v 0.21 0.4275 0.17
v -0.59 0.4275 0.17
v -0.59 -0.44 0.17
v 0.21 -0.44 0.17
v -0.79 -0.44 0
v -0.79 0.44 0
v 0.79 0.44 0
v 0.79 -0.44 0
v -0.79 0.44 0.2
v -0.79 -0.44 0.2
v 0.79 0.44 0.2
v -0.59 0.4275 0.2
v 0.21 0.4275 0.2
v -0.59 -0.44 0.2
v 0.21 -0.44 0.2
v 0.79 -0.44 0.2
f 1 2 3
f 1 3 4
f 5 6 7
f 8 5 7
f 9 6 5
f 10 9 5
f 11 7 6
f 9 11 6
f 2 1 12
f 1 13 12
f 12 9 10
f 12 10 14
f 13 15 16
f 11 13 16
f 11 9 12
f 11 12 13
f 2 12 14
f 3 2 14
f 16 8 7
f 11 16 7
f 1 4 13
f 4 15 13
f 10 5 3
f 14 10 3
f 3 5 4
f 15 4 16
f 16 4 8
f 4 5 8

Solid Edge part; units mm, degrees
sketch "Sketch1" plane through (0, 0, 0) normal (0, 0, 1) x (1, 0, 0)
  line L0 (-0.79, -0.44) -> (0.79, -0.44)
  line L1 (0.79, -0.44) -> (0.79, 0.44)
  line L2 (0.79, 0.44) -> (-0.79, 0.44)
  line L3 (-0.79, 0.44) -> (-0.79, -0.44)
  dimension "D1" = 0.88
  dimension "D2" = 1.58
extrude "Protrusion1" add sketch "Sketch1" along normal blind 0.2
sketch "Sketch2" plane through (0, 0, 0.2) normal (0, 0, 1) x (1, 0, 0)
  line L0 (-0.59, 0.4275) -> (-0.59, -0.44)
  line L1 (-0.59, -0.44) -> (0.21, -0.44)
  line L2 (0.21, -0.44) -> (0.21, 0.4275)
  line L3 (0.21, 0.4275) -> (-0.59, 0.4275)
  dimension "D1" = 0.2
  dimension "D2" = 0.8
extrude "Ausschnitt_1" cut sketch "Sketch2" against normal blind 0.03
